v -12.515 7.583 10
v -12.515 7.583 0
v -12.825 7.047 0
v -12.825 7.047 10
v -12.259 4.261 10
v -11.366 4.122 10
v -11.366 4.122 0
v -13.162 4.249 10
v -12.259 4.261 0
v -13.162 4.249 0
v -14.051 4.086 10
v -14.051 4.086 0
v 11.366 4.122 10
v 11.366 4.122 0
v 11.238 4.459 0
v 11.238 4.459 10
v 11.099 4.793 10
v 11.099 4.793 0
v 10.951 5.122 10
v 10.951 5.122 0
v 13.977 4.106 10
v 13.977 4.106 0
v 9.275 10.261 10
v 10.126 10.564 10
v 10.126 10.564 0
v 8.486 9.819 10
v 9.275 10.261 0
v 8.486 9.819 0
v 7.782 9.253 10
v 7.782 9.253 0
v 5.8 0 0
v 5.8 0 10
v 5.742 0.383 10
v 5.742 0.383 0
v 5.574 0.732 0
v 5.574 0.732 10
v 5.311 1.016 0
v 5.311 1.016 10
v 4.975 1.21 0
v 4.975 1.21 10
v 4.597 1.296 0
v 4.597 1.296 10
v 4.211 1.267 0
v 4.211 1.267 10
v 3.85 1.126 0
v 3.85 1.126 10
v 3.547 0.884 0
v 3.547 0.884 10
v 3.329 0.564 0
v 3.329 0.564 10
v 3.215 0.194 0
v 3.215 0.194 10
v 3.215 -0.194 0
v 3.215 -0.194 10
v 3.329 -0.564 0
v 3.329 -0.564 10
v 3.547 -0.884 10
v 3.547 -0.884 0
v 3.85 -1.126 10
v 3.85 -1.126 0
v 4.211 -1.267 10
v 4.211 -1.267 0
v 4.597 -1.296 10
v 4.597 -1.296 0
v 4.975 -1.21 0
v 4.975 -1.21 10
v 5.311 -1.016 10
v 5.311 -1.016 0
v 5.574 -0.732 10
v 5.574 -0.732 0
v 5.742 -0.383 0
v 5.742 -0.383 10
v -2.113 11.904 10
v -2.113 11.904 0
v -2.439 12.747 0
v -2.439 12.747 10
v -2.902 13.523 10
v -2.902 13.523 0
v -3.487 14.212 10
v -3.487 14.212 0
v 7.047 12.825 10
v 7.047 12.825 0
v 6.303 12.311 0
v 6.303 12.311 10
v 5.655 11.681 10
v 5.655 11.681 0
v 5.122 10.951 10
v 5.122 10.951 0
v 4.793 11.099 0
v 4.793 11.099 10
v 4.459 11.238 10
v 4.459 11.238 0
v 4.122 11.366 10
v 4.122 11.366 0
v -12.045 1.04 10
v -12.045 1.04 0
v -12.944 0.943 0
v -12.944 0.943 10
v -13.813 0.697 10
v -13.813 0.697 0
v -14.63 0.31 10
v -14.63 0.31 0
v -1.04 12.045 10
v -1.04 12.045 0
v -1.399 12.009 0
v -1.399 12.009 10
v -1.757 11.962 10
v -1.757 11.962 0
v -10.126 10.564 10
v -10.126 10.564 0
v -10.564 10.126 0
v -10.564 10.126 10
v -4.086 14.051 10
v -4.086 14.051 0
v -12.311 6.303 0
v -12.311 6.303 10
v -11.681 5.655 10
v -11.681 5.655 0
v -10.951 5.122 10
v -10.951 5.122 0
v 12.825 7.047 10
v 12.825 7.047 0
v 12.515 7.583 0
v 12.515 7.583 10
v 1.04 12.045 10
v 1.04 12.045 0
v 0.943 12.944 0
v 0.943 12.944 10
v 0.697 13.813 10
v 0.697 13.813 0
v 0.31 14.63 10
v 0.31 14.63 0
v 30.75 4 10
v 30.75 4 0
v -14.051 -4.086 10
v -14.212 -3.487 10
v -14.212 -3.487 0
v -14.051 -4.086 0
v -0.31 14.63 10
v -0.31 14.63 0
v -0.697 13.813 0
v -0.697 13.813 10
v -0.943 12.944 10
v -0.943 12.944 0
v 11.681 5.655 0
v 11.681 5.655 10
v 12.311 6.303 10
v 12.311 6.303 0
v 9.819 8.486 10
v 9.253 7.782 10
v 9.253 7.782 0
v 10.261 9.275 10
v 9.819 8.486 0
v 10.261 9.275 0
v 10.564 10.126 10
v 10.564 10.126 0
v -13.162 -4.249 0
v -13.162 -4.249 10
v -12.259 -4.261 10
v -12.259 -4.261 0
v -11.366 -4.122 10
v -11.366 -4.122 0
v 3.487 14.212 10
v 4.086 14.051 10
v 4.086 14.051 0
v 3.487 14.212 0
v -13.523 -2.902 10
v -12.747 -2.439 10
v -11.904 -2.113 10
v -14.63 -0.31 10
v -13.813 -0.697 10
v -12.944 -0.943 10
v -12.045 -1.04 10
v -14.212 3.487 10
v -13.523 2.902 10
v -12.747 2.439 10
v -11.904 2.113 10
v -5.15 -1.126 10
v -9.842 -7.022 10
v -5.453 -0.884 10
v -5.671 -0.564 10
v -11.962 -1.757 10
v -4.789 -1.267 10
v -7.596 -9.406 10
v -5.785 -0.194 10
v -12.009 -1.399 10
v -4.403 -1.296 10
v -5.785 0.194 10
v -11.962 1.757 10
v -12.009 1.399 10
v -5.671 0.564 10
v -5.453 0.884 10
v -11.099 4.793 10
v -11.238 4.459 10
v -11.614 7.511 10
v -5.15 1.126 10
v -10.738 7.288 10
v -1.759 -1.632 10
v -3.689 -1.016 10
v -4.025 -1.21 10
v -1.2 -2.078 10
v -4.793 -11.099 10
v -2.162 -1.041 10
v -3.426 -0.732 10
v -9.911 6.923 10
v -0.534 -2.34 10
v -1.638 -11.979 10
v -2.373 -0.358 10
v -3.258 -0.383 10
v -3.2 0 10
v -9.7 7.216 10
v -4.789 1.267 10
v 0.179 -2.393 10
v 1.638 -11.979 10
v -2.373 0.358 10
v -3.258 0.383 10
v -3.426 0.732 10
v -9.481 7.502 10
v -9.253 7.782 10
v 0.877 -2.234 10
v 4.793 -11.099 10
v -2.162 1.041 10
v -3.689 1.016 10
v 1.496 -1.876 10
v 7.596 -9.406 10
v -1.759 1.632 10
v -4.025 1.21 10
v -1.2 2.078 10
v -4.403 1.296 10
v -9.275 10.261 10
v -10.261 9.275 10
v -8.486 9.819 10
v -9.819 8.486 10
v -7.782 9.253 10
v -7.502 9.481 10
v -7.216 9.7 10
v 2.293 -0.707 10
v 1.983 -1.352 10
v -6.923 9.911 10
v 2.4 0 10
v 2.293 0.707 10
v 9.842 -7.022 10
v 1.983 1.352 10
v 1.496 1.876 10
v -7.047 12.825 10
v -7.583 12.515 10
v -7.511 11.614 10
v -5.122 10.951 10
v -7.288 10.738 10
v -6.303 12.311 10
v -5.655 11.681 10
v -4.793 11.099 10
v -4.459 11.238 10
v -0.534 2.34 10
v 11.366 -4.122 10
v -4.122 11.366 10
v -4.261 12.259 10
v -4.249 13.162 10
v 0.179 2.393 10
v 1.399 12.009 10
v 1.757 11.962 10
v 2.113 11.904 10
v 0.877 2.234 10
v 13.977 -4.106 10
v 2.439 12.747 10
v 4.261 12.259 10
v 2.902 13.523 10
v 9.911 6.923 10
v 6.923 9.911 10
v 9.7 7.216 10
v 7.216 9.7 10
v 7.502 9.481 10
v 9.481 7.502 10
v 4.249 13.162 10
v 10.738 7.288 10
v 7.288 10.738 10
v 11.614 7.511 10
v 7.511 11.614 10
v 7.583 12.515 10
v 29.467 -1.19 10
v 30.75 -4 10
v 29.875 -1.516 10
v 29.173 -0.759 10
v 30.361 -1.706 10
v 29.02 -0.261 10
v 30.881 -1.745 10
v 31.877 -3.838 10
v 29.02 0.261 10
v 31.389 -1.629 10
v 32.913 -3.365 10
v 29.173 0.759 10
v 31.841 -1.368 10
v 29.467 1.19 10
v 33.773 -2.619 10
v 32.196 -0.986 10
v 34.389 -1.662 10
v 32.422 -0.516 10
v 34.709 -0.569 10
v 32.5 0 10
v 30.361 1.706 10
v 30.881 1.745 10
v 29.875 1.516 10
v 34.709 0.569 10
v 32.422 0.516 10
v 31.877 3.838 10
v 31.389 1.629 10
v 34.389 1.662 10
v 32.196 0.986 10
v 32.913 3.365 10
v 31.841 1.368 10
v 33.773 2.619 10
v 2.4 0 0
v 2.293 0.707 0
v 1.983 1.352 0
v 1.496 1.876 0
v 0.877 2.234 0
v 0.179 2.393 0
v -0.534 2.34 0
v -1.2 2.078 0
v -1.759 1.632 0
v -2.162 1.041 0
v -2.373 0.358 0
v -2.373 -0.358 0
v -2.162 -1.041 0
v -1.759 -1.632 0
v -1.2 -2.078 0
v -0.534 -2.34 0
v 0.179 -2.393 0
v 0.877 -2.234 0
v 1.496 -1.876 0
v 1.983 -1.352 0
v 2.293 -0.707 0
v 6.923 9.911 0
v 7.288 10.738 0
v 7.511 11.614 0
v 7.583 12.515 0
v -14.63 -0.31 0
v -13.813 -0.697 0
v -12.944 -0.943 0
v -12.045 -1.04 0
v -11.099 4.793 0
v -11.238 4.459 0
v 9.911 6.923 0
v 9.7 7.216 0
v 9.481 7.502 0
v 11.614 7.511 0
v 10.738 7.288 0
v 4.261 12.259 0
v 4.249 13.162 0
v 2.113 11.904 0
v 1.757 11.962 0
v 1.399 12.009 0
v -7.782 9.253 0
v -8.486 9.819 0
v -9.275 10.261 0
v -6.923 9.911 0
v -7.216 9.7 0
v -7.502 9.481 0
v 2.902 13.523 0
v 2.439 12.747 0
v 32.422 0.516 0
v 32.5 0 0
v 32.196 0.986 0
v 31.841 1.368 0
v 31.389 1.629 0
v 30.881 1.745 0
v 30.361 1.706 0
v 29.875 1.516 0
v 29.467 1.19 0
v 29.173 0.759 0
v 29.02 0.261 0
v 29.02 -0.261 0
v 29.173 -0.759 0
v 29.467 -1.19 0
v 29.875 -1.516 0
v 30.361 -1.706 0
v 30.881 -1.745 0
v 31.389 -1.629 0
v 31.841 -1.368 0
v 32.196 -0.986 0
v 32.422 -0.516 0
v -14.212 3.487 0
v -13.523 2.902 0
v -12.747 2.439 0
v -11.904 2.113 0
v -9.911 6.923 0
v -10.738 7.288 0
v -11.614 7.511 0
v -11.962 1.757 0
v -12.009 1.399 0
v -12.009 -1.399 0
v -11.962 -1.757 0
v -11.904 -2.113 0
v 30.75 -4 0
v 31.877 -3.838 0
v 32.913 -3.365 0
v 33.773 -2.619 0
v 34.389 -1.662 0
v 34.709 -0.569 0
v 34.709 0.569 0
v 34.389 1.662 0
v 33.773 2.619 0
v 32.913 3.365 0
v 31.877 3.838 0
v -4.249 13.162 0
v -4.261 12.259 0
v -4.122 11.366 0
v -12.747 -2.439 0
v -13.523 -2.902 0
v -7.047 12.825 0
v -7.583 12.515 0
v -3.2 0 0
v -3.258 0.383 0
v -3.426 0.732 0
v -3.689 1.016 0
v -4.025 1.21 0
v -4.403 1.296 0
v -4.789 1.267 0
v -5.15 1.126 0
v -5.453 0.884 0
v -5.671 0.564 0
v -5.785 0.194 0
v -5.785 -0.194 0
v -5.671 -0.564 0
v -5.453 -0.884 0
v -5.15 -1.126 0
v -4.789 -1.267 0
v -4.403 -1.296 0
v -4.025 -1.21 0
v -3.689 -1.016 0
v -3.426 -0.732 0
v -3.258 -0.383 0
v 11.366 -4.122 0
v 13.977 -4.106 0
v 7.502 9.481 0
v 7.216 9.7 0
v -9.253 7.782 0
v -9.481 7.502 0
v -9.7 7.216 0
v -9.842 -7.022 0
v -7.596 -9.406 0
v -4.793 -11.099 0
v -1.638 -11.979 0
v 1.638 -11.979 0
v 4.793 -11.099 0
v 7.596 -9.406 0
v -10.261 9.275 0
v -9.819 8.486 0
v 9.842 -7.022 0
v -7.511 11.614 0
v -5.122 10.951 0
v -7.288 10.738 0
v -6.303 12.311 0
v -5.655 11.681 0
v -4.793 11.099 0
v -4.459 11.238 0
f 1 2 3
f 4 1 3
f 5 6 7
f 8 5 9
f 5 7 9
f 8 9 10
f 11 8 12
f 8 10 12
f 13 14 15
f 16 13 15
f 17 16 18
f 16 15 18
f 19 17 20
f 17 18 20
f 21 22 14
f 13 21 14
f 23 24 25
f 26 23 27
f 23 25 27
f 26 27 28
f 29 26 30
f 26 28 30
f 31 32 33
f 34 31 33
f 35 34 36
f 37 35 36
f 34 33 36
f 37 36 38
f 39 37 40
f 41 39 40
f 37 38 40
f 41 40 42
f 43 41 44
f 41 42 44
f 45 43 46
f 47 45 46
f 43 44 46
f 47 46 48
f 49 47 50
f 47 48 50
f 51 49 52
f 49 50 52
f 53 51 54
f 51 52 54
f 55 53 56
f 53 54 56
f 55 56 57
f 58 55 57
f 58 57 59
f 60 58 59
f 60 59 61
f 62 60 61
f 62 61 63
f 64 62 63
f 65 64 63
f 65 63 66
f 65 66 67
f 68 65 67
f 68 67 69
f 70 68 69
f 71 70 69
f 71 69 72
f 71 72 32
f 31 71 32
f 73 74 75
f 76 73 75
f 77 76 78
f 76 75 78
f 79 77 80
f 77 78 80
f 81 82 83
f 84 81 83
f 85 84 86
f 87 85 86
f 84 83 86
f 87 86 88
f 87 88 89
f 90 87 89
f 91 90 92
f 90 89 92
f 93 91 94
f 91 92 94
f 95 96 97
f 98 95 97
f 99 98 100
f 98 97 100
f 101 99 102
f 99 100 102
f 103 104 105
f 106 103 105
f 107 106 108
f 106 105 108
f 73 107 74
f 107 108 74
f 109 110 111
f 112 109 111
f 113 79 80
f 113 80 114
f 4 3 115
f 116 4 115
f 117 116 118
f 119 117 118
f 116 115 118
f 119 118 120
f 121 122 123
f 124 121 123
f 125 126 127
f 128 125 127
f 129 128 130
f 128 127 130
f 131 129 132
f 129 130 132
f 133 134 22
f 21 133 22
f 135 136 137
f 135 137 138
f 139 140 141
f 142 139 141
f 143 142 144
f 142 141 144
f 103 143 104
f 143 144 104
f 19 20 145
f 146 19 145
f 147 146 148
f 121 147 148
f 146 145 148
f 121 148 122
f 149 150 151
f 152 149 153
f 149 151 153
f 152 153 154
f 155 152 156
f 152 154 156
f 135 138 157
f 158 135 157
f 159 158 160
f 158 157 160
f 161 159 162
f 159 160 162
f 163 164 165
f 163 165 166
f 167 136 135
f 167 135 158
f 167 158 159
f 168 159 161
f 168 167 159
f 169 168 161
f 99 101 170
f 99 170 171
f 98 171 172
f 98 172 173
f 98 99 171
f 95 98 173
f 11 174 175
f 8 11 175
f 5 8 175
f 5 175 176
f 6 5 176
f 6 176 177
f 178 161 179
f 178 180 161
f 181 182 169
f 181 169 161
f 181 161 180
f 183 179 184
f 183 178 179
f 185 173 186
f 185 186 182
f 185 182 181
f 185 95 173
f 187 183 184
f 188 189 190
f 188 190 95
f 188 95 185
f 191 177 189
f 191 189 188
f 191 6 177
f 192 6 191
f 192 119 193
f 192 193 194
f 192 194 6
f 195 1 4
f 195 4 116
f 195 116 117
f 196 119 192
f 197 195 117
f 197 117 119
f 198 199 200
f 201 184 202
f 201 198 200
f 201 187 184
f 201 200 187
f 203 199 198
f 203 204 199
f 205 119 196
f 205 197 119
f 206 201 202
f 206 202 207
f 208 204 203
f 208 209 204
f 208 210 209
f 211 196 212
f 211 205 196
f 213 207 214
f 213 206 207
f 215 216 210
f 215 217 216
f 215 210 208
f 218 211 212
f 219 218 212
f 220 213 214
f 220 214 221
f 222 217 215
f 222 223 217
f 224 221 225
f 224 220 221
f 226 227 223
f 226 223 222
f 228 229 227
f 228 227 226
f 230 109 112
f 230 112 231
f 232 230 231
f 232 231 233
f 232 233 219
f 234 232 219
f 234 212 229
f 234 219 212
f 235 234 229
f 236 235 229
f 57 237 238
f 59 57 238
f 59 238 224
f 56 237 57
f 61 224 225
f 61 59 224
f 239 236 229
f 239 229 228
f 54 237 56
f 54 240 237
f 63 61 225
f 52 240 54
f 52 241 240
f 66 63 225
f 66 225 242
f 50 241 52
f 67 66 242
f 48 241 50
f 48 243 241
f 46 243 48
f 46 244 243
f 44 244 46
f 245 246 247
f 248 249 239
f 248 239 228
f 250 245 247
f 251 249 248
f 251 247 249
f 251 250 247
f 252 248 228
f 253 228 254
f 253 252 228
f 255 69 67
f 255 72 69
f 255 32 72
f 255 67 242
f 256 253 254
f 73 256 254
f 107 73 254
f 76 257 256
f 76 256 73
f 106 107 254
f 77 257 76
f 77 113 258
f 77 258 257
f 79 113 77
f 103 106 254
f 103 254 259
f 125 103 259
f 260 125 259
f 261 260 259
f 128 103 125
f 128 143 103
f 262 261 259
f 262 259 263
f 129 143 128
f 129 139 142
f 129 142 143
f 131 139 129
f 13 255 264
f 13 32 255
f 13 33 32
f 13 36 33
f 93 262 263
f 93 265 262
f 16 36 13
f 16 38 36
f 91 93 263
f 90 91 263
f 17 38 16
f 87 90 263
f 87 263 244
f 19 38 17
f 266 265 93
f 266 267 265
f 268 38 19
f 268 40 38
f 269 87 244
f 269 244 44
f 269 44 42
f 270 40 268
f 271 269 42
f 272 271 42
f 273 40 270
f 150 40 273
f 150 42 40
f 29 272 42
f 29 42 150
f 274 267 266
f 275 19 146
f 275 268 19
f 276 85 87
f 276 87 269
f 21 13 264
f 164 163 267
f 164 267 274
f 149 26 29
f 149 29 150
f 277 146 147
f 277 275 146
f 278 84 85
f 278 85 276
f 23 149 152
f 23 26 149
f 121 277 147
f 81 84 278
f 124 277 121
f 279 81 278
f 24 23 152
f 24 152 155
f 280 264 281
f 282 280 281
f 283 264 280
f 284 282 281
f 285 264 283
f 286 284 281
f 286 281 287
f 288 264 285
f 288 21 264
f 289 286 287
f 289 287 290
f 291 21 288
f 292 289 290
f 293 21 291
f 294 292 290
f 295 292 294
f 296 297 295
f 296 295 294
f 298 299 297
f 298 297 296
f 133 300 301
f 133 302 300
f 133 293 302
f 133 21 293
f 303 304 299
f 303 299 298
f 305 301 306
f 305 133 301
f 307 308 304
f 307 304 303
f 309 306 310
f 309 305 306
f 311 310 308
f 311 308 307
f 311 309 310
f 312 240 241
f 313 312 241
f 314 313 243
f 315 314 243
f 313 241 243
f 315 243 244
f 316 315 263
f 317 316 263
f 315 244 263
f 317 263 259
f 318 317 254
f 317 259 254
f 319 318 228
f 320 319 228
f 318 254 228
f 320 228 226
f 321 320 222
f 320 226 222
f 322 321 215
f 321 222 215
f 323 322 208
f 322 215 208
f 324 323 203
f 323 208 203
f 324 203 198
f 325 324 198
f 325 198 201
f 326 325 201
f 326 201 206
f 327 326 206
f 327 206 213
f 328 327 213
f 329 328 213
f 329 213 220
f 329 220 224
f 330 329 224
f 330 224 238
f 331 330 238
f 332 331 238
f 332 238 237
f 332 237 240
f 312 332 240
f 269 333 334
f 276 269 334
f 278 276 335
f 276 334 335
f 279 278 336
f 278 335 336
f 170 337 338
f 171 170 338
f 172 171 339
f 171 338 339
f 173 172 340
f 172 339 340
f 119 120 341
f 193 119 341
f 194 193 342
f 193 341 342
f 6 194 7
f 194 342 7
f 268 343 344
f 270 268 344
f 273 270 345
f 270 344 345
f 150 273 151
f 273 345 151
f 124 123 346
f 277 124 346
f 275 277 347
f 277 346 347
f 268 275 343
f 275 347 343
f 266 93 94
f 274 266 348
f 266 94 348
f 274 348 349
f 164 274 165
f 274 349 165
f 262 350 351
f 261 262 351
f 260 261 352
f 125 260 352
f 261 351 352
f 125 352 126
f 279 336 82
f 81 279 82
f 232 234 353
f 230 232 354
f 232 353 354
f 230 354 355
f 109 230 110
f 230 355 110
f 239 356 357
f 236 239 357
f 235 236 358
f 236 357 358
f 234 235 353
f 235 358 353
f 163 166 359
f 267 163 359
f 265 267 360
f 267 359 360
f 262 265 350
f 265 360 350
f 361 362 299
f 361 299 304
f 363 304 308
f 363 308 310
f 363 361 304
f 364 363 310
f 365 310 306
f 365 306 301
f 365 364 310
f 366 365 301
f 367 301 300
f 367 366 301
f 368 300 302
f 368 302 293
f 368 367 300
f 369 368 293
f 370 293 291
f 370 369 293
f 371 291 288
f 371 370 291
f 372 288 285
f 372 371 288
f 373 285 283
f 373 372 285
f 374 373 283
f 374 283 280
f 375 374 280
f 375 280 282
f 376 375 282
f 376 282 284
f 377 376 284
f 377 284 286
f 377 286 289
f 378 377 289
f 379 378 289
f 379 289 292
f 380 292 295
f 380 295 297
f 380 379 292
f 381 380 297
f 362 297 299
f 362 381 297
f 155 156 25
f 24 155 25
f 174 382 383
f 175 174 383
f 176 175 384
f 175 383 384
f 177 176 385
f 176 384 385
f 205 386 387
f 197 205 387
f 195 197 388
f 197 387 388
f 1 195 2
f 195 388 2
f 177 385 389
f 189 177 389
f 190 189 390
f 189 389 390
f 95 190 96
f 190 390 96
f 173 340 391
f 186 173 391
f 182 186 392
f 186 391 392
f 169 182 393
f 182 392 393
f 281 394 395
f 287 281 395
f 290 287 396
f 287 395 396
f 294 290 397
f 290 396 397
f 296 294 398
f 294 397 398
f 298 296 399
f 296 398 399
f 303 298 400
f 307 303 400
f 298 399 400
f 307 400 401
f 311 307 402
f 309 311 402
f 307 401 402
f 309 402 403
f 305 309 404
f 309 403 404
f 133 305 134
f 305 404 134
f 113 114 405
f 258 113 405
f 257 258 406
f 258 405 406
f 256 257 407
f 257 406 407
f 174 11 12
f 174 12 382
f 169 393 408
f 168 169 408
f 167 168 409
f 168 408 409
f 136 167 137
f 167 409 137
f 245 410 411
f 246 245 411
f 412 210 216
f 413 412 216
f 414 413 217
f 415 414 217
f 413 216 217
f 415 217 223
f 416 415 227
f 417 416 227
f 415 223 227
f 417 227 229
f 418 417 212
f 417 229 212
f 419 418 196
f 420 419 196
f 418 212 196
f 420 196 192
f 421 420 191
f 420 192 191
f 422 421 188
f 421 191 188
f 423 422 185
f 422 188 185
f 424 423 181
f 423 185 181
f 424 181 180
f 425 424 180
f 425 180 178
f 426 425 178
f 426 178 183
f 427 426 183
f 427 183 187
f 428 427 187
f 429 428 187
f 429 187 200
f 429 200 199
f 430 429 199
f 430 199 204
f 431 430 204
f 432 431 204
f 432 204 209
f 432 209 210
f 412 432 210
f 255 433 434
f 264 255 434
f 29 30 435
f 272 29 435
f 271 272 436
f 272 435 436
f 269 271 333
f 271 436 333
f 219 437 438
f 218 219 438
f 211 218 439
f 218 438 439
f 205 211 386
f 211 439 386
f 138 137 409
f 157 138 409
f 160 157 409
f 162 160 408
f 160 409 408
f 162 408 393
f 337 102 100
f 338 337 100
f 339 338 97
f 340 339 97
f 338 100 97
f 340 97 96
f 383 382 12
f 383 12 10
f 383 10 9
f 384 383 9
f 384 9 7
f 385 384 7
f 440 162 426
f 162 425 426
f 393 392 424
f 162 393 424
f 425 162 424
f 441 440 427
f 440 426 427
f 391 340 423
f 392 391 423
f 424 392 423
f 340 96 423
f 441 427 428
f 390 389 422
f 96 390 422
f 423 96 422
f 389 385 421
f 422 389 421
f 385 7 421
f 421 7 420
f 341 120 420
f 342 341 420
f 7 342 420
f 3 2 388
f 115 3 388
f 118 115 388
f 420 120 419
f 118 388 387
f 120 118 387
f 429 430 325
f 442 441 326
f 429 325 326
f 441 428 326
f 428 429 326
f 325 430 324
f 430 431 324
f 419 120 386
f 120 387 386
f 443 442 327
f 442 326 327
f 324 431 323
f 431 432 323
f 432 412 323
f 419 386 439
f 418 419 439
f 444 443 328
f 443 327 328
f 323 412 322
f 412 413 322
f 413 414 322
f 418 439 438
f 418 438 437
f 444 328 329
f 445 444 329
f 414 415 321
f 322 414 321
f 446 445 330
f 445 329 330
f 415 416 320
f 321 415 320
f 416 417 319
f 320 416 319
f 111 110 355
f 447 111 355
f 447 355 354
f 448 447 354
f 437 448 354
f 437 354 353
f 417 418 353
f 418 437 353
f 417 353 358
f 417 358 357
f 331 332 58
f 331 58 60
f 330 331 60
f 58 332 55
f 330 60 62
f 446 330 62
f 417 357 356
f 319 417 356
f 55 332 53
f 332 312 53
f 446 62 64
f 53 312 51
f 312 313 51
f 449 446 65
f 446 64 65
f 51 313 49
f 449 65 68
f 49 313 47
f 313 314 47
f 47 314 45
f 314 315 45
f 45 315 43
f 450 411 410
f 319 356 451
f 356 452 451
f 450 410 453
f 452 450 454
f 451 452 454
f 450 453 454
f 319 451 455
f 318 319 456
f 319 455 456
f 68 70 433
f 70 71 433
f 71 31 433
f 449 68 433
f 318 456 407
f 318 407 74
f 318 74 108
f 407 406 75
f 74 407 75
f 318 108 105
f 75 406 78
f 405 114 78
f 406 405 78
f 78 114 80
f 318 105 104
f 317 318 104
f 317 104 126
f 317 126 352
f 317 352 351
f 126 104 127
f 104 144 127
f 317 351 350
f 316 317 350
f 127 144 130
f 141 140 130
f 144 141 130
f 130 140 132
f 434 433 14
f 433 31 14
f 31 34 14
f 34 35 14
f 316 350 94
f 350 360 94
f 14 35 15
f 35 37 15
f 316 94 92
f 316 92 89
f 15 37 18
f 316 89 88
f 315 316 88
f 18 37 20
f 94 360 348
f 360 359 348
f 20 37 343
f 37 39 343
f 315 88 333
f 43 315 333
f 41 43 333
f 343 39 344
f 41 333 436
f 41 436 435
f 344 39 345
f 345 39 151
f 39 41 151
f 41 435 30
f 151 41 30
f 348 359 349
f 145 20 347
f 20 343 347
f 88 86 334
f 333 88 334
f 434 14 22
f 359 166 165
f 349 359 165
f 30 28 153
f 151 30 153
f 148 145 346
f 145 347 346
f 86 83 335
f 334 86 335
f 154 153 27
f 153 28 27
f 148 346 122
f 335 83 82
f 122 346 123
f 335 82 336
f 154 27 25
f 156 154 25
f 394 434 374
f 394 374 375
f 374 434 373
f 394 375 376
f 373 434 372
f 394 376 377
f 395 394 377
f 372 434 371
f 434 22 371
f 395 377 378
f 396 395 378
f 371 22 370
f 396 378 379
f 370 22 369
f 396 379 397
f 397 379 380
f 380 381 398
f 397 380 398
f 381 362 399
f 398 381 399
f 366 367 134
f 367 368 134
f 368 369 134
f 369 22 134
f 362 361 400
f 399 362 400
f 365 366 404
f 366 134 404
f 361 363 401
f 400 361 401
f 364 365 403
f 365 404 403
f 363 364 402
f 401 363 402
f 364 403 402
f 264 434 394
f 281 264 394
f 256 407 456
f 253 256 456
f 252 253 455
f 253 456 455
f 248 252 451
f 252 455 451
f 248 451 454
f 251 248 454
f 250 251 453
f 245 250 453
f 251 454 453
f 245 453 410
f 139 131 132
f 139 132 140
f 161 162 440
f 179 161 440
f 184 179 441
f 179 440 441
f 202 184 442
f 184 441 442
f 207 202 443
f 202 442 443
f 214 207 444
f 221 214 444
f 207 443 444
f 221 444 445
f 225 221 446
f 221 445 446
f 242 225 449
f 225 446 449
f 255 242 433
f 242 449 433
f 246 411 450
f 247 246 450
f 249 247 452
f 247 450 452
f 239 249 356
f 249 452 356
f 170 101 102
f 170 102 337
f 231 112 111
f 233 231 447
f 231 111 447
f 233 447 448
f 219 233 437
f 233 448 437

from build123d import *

# Parameters (mm, degrees)
SKETCH1_R            = 1.75
BOSS_EXTRUDE13_DEPTH = 10
SKETCH2_R            = 1.3
SKETCH2_R_2          = 2.4
CUT_EXTRUDE1_DEPTH   = 40.007683858


with BuildPart() as part:
    # Sketch1 → Boss-Extrude13 (new body)
    with BuildSketch(Plane.XY):
        with BuildLine():
            ThreePointArc((1.04, 12.04518576), (0.838273314, 13.383704325), (0.31, 14.63))
            Line((0.31, 14.63), (-0.31, 14.63))
            ThreePointArc((-0.31, 14.63), (-0.838273314, 13.383704325), (-1.04, 12.04518576))
            ThreePointArc((-1.04, 12.04518576), (-1.578061664, 11.986568374), (-2.112960617, 11.903927815))
            ThreePointArc((-2.112960617, 11.903927815), (-2.65424773, 13.144626757), (-3.487085624, 14.211728743))
            Line((-3.487085624, 14.211728743), (-4.085959636, 14.051260935))
            ThreePointArc((-4.085959636, 14.051260935), (-4.273667417, 12.71070456), (-4.122086336, 11.365584201))
            ThreePointArc((-4.122086336, 11.365584201), (-4.626642697, 11.169703548), (-5.12192646, 10.951436862))
            ThreePointArc((-5.12192646, 10.951436862), (-5.965886177, 12.009764599), (-7.046532125, 12.824951657))
            Line((-7.046532125, 12.824951657), (-7.583467875, 12.514951657))
            ThreePointArc((-7.583467875, 12.514951657), (-7.417818147, 11.171491285), (-6.9232593, 9.911436862))
            ThreePointArc((-6.9232593, 9.911436862), (-7.359925677, 9.591641884), (-7.781841479, 9.252623584))
            ThreePointArc((-7.781841479, 9.252623584), (-8.870959341, 10.05645683), (-10.125769107, 10.564175311))
            Line((-10.125769107, 10.564175311), (-10.564175311, 10.125769107))
            ThreePointArc((-10.564175311, 10.125769107), (-10.05645683, 8.870959341), (-9.252623584, 7.781841479))
            ThreePointArc((-9.252623584, 7.781841479), (-9.591641884, 7.359925677), (-9.911436862, 6.9232593))
            ThreePointArc((-9.911436862, 6.9232593), (-11.171491285, 7.417818147), (-12.514951657, 7.583467875))
            Line((-12.514951657, 7.583467875), (-12.824951657, 7.046532125))
            ThreePointArc((-12.824951657, 7.046532125), (-12.009764599, 5.965886177), (-10.951436862, 5.12192646))
            ThreePointArc((-10.951436862, 5.12192646), (-11.169703548, 4.626642697), (-11.365584201, 4.122086336))
            ThreePointArc((-11.365584201, 4.122086336), (-12.71070456, 4.273667417), (-14.051260935, 4.085959636))
            Line((-14.051260935, 4.085959636), (-14.211728743, 3.487085624))
            ThreePointArc((-14.211728743, 3.487085624), (-13.144626757, 2.65424773), (-11.903927815, 2.112960617))
            ThreePointArc((-11.903927815, 2.112960617), (-11.986568374, 1.578061664), (-12.04518576, 1.04))
            ThreePointArc((-12.04518576, 1.04), (-13.383704325, 0.838273314), (-14.63, 0.31))
            Line((-14.63, 0.31), (-14.63, -0.31))
            ThreePointArc((-14.63, -0.31), (-13.383704325, -0.838273314), (-12.04518576, -1.04))
            ThreePointArc((-12.04518576, -1.04), (-11.986568374, -1.578061664), (-11.903927815, -2.112960617))
            ThreePointArc((-11.903927815, -2.112960617), (-13.144626757, -2.65424773), (-14.211728743, -3.487085624))
            Line((-14.211728743, -3.487085624), (-14.051260935, -4.085959636))
            ThreePointArc((-14.051260935, -4.085959636), (-12.71070456, -4.273667417), (-11.365584201, -4.122086336))
            ThreePointArc((-11.365584201, -4.122086336), (0, -12.09), (11.365584201, -4.122086336))
            Line((11.365584201, -4.122086336), (30.75, -4))
            ThreePointArc((30.75, -4), (34.75, 0), (30.75, 4))
            Line((30.75, 4), (11.365584201, 4.122086336))
            ThreePointArc((11.365584201, 4.122086336), (11.169703548, 4.626642697), (10.951436862, 5.12192646))
            ThreePointArc((10.951436862, 5.12192646), (12.009764599, 5.965886177), (12.824951657, 7.046532125))
            Line((12.824951657, 7.046532125), (12.514951657, 7.583467875))
            ThreePointArc((12.514951657, 7.583467875), (11.171491285, 7.417818147), (9.911436862, 6.9232593))
            ThreePointArc((9.911436862, 6.9232593), (9.591641884, 7.359925677), (9.252623584, 7.781841479))
            ThreePointArc((9.252623584, 7.781841479), (10.05645683, 8.870959341), (10.564175311, 10.125769107))
            Line((10.564175311, 10.125769107), (10.125769107, 10.564175311))
            ThreePointArc((10.125769107, 10.564175311), (8.870959341, 10.05645683), (7.781841479, 9.252623584))
            ThreePointArc((7.781841479, 9.252623584), (7.359925677, 9.591641884), (6.9232593, 9.911436862))
            ThreePointArc((6.9232593, 9.911436862), (7.417818147, 11.171491285), (7.583467875, 12.514951657))
            Line((7.583467875, 12.514951657), (7.046532125, 12.824951657))
            ThreePointArc((7.046532125, 12.824951657), (5.965886177, 12.009764599), (5.12192646, 10.951436862))
            ThreePointArc((5.12192646, 10.951436862), (4.626642697, 11.169703548), (4.122086336, 11.365584201))
            ThreePointArc((4.122086336, 11.365584201), (4.273667417, 12.71070456), (4.085959636, 14.051260935))
            Line((4.085959636, 14.051260935), (3.487085624, 14.211728743))
            ThreePointArc((3.487085624, 14.211728743), (2.65424773, 13.144626757), (2.112960617, 11.903927815))
            ThreePointArc((2.112960617, 11.903927815), (1.578061664, 11.986568374), (1.04, 12.04518576))
        make_face()
        Circle(SKETCH1_R, mode=Mode.SUBTRACT)
        with Locations((30.75, 0)):
            Circle(SKETCH1_R, mode=Mode.SUBTRACT)
    extrude(amount=BOSS_EXTRUDE13_DEPTH)

    # Sketch2 → Cut-Extrude1 (cut, through all)
    with BuildSketch(Plane.XY.offset(10)):
        with Locations((-4.5, 0)):
            Circle(SKETCH2_R)
        with Locations((4.5, 0)):
            Circle(SKETCH2_R)
        Circle(SKETCH2_R_2)
    extrude(amount=-CUT_EXTRUDE1_DEPTH, mode=Mode.SUBTRACT)


solid = part.part
